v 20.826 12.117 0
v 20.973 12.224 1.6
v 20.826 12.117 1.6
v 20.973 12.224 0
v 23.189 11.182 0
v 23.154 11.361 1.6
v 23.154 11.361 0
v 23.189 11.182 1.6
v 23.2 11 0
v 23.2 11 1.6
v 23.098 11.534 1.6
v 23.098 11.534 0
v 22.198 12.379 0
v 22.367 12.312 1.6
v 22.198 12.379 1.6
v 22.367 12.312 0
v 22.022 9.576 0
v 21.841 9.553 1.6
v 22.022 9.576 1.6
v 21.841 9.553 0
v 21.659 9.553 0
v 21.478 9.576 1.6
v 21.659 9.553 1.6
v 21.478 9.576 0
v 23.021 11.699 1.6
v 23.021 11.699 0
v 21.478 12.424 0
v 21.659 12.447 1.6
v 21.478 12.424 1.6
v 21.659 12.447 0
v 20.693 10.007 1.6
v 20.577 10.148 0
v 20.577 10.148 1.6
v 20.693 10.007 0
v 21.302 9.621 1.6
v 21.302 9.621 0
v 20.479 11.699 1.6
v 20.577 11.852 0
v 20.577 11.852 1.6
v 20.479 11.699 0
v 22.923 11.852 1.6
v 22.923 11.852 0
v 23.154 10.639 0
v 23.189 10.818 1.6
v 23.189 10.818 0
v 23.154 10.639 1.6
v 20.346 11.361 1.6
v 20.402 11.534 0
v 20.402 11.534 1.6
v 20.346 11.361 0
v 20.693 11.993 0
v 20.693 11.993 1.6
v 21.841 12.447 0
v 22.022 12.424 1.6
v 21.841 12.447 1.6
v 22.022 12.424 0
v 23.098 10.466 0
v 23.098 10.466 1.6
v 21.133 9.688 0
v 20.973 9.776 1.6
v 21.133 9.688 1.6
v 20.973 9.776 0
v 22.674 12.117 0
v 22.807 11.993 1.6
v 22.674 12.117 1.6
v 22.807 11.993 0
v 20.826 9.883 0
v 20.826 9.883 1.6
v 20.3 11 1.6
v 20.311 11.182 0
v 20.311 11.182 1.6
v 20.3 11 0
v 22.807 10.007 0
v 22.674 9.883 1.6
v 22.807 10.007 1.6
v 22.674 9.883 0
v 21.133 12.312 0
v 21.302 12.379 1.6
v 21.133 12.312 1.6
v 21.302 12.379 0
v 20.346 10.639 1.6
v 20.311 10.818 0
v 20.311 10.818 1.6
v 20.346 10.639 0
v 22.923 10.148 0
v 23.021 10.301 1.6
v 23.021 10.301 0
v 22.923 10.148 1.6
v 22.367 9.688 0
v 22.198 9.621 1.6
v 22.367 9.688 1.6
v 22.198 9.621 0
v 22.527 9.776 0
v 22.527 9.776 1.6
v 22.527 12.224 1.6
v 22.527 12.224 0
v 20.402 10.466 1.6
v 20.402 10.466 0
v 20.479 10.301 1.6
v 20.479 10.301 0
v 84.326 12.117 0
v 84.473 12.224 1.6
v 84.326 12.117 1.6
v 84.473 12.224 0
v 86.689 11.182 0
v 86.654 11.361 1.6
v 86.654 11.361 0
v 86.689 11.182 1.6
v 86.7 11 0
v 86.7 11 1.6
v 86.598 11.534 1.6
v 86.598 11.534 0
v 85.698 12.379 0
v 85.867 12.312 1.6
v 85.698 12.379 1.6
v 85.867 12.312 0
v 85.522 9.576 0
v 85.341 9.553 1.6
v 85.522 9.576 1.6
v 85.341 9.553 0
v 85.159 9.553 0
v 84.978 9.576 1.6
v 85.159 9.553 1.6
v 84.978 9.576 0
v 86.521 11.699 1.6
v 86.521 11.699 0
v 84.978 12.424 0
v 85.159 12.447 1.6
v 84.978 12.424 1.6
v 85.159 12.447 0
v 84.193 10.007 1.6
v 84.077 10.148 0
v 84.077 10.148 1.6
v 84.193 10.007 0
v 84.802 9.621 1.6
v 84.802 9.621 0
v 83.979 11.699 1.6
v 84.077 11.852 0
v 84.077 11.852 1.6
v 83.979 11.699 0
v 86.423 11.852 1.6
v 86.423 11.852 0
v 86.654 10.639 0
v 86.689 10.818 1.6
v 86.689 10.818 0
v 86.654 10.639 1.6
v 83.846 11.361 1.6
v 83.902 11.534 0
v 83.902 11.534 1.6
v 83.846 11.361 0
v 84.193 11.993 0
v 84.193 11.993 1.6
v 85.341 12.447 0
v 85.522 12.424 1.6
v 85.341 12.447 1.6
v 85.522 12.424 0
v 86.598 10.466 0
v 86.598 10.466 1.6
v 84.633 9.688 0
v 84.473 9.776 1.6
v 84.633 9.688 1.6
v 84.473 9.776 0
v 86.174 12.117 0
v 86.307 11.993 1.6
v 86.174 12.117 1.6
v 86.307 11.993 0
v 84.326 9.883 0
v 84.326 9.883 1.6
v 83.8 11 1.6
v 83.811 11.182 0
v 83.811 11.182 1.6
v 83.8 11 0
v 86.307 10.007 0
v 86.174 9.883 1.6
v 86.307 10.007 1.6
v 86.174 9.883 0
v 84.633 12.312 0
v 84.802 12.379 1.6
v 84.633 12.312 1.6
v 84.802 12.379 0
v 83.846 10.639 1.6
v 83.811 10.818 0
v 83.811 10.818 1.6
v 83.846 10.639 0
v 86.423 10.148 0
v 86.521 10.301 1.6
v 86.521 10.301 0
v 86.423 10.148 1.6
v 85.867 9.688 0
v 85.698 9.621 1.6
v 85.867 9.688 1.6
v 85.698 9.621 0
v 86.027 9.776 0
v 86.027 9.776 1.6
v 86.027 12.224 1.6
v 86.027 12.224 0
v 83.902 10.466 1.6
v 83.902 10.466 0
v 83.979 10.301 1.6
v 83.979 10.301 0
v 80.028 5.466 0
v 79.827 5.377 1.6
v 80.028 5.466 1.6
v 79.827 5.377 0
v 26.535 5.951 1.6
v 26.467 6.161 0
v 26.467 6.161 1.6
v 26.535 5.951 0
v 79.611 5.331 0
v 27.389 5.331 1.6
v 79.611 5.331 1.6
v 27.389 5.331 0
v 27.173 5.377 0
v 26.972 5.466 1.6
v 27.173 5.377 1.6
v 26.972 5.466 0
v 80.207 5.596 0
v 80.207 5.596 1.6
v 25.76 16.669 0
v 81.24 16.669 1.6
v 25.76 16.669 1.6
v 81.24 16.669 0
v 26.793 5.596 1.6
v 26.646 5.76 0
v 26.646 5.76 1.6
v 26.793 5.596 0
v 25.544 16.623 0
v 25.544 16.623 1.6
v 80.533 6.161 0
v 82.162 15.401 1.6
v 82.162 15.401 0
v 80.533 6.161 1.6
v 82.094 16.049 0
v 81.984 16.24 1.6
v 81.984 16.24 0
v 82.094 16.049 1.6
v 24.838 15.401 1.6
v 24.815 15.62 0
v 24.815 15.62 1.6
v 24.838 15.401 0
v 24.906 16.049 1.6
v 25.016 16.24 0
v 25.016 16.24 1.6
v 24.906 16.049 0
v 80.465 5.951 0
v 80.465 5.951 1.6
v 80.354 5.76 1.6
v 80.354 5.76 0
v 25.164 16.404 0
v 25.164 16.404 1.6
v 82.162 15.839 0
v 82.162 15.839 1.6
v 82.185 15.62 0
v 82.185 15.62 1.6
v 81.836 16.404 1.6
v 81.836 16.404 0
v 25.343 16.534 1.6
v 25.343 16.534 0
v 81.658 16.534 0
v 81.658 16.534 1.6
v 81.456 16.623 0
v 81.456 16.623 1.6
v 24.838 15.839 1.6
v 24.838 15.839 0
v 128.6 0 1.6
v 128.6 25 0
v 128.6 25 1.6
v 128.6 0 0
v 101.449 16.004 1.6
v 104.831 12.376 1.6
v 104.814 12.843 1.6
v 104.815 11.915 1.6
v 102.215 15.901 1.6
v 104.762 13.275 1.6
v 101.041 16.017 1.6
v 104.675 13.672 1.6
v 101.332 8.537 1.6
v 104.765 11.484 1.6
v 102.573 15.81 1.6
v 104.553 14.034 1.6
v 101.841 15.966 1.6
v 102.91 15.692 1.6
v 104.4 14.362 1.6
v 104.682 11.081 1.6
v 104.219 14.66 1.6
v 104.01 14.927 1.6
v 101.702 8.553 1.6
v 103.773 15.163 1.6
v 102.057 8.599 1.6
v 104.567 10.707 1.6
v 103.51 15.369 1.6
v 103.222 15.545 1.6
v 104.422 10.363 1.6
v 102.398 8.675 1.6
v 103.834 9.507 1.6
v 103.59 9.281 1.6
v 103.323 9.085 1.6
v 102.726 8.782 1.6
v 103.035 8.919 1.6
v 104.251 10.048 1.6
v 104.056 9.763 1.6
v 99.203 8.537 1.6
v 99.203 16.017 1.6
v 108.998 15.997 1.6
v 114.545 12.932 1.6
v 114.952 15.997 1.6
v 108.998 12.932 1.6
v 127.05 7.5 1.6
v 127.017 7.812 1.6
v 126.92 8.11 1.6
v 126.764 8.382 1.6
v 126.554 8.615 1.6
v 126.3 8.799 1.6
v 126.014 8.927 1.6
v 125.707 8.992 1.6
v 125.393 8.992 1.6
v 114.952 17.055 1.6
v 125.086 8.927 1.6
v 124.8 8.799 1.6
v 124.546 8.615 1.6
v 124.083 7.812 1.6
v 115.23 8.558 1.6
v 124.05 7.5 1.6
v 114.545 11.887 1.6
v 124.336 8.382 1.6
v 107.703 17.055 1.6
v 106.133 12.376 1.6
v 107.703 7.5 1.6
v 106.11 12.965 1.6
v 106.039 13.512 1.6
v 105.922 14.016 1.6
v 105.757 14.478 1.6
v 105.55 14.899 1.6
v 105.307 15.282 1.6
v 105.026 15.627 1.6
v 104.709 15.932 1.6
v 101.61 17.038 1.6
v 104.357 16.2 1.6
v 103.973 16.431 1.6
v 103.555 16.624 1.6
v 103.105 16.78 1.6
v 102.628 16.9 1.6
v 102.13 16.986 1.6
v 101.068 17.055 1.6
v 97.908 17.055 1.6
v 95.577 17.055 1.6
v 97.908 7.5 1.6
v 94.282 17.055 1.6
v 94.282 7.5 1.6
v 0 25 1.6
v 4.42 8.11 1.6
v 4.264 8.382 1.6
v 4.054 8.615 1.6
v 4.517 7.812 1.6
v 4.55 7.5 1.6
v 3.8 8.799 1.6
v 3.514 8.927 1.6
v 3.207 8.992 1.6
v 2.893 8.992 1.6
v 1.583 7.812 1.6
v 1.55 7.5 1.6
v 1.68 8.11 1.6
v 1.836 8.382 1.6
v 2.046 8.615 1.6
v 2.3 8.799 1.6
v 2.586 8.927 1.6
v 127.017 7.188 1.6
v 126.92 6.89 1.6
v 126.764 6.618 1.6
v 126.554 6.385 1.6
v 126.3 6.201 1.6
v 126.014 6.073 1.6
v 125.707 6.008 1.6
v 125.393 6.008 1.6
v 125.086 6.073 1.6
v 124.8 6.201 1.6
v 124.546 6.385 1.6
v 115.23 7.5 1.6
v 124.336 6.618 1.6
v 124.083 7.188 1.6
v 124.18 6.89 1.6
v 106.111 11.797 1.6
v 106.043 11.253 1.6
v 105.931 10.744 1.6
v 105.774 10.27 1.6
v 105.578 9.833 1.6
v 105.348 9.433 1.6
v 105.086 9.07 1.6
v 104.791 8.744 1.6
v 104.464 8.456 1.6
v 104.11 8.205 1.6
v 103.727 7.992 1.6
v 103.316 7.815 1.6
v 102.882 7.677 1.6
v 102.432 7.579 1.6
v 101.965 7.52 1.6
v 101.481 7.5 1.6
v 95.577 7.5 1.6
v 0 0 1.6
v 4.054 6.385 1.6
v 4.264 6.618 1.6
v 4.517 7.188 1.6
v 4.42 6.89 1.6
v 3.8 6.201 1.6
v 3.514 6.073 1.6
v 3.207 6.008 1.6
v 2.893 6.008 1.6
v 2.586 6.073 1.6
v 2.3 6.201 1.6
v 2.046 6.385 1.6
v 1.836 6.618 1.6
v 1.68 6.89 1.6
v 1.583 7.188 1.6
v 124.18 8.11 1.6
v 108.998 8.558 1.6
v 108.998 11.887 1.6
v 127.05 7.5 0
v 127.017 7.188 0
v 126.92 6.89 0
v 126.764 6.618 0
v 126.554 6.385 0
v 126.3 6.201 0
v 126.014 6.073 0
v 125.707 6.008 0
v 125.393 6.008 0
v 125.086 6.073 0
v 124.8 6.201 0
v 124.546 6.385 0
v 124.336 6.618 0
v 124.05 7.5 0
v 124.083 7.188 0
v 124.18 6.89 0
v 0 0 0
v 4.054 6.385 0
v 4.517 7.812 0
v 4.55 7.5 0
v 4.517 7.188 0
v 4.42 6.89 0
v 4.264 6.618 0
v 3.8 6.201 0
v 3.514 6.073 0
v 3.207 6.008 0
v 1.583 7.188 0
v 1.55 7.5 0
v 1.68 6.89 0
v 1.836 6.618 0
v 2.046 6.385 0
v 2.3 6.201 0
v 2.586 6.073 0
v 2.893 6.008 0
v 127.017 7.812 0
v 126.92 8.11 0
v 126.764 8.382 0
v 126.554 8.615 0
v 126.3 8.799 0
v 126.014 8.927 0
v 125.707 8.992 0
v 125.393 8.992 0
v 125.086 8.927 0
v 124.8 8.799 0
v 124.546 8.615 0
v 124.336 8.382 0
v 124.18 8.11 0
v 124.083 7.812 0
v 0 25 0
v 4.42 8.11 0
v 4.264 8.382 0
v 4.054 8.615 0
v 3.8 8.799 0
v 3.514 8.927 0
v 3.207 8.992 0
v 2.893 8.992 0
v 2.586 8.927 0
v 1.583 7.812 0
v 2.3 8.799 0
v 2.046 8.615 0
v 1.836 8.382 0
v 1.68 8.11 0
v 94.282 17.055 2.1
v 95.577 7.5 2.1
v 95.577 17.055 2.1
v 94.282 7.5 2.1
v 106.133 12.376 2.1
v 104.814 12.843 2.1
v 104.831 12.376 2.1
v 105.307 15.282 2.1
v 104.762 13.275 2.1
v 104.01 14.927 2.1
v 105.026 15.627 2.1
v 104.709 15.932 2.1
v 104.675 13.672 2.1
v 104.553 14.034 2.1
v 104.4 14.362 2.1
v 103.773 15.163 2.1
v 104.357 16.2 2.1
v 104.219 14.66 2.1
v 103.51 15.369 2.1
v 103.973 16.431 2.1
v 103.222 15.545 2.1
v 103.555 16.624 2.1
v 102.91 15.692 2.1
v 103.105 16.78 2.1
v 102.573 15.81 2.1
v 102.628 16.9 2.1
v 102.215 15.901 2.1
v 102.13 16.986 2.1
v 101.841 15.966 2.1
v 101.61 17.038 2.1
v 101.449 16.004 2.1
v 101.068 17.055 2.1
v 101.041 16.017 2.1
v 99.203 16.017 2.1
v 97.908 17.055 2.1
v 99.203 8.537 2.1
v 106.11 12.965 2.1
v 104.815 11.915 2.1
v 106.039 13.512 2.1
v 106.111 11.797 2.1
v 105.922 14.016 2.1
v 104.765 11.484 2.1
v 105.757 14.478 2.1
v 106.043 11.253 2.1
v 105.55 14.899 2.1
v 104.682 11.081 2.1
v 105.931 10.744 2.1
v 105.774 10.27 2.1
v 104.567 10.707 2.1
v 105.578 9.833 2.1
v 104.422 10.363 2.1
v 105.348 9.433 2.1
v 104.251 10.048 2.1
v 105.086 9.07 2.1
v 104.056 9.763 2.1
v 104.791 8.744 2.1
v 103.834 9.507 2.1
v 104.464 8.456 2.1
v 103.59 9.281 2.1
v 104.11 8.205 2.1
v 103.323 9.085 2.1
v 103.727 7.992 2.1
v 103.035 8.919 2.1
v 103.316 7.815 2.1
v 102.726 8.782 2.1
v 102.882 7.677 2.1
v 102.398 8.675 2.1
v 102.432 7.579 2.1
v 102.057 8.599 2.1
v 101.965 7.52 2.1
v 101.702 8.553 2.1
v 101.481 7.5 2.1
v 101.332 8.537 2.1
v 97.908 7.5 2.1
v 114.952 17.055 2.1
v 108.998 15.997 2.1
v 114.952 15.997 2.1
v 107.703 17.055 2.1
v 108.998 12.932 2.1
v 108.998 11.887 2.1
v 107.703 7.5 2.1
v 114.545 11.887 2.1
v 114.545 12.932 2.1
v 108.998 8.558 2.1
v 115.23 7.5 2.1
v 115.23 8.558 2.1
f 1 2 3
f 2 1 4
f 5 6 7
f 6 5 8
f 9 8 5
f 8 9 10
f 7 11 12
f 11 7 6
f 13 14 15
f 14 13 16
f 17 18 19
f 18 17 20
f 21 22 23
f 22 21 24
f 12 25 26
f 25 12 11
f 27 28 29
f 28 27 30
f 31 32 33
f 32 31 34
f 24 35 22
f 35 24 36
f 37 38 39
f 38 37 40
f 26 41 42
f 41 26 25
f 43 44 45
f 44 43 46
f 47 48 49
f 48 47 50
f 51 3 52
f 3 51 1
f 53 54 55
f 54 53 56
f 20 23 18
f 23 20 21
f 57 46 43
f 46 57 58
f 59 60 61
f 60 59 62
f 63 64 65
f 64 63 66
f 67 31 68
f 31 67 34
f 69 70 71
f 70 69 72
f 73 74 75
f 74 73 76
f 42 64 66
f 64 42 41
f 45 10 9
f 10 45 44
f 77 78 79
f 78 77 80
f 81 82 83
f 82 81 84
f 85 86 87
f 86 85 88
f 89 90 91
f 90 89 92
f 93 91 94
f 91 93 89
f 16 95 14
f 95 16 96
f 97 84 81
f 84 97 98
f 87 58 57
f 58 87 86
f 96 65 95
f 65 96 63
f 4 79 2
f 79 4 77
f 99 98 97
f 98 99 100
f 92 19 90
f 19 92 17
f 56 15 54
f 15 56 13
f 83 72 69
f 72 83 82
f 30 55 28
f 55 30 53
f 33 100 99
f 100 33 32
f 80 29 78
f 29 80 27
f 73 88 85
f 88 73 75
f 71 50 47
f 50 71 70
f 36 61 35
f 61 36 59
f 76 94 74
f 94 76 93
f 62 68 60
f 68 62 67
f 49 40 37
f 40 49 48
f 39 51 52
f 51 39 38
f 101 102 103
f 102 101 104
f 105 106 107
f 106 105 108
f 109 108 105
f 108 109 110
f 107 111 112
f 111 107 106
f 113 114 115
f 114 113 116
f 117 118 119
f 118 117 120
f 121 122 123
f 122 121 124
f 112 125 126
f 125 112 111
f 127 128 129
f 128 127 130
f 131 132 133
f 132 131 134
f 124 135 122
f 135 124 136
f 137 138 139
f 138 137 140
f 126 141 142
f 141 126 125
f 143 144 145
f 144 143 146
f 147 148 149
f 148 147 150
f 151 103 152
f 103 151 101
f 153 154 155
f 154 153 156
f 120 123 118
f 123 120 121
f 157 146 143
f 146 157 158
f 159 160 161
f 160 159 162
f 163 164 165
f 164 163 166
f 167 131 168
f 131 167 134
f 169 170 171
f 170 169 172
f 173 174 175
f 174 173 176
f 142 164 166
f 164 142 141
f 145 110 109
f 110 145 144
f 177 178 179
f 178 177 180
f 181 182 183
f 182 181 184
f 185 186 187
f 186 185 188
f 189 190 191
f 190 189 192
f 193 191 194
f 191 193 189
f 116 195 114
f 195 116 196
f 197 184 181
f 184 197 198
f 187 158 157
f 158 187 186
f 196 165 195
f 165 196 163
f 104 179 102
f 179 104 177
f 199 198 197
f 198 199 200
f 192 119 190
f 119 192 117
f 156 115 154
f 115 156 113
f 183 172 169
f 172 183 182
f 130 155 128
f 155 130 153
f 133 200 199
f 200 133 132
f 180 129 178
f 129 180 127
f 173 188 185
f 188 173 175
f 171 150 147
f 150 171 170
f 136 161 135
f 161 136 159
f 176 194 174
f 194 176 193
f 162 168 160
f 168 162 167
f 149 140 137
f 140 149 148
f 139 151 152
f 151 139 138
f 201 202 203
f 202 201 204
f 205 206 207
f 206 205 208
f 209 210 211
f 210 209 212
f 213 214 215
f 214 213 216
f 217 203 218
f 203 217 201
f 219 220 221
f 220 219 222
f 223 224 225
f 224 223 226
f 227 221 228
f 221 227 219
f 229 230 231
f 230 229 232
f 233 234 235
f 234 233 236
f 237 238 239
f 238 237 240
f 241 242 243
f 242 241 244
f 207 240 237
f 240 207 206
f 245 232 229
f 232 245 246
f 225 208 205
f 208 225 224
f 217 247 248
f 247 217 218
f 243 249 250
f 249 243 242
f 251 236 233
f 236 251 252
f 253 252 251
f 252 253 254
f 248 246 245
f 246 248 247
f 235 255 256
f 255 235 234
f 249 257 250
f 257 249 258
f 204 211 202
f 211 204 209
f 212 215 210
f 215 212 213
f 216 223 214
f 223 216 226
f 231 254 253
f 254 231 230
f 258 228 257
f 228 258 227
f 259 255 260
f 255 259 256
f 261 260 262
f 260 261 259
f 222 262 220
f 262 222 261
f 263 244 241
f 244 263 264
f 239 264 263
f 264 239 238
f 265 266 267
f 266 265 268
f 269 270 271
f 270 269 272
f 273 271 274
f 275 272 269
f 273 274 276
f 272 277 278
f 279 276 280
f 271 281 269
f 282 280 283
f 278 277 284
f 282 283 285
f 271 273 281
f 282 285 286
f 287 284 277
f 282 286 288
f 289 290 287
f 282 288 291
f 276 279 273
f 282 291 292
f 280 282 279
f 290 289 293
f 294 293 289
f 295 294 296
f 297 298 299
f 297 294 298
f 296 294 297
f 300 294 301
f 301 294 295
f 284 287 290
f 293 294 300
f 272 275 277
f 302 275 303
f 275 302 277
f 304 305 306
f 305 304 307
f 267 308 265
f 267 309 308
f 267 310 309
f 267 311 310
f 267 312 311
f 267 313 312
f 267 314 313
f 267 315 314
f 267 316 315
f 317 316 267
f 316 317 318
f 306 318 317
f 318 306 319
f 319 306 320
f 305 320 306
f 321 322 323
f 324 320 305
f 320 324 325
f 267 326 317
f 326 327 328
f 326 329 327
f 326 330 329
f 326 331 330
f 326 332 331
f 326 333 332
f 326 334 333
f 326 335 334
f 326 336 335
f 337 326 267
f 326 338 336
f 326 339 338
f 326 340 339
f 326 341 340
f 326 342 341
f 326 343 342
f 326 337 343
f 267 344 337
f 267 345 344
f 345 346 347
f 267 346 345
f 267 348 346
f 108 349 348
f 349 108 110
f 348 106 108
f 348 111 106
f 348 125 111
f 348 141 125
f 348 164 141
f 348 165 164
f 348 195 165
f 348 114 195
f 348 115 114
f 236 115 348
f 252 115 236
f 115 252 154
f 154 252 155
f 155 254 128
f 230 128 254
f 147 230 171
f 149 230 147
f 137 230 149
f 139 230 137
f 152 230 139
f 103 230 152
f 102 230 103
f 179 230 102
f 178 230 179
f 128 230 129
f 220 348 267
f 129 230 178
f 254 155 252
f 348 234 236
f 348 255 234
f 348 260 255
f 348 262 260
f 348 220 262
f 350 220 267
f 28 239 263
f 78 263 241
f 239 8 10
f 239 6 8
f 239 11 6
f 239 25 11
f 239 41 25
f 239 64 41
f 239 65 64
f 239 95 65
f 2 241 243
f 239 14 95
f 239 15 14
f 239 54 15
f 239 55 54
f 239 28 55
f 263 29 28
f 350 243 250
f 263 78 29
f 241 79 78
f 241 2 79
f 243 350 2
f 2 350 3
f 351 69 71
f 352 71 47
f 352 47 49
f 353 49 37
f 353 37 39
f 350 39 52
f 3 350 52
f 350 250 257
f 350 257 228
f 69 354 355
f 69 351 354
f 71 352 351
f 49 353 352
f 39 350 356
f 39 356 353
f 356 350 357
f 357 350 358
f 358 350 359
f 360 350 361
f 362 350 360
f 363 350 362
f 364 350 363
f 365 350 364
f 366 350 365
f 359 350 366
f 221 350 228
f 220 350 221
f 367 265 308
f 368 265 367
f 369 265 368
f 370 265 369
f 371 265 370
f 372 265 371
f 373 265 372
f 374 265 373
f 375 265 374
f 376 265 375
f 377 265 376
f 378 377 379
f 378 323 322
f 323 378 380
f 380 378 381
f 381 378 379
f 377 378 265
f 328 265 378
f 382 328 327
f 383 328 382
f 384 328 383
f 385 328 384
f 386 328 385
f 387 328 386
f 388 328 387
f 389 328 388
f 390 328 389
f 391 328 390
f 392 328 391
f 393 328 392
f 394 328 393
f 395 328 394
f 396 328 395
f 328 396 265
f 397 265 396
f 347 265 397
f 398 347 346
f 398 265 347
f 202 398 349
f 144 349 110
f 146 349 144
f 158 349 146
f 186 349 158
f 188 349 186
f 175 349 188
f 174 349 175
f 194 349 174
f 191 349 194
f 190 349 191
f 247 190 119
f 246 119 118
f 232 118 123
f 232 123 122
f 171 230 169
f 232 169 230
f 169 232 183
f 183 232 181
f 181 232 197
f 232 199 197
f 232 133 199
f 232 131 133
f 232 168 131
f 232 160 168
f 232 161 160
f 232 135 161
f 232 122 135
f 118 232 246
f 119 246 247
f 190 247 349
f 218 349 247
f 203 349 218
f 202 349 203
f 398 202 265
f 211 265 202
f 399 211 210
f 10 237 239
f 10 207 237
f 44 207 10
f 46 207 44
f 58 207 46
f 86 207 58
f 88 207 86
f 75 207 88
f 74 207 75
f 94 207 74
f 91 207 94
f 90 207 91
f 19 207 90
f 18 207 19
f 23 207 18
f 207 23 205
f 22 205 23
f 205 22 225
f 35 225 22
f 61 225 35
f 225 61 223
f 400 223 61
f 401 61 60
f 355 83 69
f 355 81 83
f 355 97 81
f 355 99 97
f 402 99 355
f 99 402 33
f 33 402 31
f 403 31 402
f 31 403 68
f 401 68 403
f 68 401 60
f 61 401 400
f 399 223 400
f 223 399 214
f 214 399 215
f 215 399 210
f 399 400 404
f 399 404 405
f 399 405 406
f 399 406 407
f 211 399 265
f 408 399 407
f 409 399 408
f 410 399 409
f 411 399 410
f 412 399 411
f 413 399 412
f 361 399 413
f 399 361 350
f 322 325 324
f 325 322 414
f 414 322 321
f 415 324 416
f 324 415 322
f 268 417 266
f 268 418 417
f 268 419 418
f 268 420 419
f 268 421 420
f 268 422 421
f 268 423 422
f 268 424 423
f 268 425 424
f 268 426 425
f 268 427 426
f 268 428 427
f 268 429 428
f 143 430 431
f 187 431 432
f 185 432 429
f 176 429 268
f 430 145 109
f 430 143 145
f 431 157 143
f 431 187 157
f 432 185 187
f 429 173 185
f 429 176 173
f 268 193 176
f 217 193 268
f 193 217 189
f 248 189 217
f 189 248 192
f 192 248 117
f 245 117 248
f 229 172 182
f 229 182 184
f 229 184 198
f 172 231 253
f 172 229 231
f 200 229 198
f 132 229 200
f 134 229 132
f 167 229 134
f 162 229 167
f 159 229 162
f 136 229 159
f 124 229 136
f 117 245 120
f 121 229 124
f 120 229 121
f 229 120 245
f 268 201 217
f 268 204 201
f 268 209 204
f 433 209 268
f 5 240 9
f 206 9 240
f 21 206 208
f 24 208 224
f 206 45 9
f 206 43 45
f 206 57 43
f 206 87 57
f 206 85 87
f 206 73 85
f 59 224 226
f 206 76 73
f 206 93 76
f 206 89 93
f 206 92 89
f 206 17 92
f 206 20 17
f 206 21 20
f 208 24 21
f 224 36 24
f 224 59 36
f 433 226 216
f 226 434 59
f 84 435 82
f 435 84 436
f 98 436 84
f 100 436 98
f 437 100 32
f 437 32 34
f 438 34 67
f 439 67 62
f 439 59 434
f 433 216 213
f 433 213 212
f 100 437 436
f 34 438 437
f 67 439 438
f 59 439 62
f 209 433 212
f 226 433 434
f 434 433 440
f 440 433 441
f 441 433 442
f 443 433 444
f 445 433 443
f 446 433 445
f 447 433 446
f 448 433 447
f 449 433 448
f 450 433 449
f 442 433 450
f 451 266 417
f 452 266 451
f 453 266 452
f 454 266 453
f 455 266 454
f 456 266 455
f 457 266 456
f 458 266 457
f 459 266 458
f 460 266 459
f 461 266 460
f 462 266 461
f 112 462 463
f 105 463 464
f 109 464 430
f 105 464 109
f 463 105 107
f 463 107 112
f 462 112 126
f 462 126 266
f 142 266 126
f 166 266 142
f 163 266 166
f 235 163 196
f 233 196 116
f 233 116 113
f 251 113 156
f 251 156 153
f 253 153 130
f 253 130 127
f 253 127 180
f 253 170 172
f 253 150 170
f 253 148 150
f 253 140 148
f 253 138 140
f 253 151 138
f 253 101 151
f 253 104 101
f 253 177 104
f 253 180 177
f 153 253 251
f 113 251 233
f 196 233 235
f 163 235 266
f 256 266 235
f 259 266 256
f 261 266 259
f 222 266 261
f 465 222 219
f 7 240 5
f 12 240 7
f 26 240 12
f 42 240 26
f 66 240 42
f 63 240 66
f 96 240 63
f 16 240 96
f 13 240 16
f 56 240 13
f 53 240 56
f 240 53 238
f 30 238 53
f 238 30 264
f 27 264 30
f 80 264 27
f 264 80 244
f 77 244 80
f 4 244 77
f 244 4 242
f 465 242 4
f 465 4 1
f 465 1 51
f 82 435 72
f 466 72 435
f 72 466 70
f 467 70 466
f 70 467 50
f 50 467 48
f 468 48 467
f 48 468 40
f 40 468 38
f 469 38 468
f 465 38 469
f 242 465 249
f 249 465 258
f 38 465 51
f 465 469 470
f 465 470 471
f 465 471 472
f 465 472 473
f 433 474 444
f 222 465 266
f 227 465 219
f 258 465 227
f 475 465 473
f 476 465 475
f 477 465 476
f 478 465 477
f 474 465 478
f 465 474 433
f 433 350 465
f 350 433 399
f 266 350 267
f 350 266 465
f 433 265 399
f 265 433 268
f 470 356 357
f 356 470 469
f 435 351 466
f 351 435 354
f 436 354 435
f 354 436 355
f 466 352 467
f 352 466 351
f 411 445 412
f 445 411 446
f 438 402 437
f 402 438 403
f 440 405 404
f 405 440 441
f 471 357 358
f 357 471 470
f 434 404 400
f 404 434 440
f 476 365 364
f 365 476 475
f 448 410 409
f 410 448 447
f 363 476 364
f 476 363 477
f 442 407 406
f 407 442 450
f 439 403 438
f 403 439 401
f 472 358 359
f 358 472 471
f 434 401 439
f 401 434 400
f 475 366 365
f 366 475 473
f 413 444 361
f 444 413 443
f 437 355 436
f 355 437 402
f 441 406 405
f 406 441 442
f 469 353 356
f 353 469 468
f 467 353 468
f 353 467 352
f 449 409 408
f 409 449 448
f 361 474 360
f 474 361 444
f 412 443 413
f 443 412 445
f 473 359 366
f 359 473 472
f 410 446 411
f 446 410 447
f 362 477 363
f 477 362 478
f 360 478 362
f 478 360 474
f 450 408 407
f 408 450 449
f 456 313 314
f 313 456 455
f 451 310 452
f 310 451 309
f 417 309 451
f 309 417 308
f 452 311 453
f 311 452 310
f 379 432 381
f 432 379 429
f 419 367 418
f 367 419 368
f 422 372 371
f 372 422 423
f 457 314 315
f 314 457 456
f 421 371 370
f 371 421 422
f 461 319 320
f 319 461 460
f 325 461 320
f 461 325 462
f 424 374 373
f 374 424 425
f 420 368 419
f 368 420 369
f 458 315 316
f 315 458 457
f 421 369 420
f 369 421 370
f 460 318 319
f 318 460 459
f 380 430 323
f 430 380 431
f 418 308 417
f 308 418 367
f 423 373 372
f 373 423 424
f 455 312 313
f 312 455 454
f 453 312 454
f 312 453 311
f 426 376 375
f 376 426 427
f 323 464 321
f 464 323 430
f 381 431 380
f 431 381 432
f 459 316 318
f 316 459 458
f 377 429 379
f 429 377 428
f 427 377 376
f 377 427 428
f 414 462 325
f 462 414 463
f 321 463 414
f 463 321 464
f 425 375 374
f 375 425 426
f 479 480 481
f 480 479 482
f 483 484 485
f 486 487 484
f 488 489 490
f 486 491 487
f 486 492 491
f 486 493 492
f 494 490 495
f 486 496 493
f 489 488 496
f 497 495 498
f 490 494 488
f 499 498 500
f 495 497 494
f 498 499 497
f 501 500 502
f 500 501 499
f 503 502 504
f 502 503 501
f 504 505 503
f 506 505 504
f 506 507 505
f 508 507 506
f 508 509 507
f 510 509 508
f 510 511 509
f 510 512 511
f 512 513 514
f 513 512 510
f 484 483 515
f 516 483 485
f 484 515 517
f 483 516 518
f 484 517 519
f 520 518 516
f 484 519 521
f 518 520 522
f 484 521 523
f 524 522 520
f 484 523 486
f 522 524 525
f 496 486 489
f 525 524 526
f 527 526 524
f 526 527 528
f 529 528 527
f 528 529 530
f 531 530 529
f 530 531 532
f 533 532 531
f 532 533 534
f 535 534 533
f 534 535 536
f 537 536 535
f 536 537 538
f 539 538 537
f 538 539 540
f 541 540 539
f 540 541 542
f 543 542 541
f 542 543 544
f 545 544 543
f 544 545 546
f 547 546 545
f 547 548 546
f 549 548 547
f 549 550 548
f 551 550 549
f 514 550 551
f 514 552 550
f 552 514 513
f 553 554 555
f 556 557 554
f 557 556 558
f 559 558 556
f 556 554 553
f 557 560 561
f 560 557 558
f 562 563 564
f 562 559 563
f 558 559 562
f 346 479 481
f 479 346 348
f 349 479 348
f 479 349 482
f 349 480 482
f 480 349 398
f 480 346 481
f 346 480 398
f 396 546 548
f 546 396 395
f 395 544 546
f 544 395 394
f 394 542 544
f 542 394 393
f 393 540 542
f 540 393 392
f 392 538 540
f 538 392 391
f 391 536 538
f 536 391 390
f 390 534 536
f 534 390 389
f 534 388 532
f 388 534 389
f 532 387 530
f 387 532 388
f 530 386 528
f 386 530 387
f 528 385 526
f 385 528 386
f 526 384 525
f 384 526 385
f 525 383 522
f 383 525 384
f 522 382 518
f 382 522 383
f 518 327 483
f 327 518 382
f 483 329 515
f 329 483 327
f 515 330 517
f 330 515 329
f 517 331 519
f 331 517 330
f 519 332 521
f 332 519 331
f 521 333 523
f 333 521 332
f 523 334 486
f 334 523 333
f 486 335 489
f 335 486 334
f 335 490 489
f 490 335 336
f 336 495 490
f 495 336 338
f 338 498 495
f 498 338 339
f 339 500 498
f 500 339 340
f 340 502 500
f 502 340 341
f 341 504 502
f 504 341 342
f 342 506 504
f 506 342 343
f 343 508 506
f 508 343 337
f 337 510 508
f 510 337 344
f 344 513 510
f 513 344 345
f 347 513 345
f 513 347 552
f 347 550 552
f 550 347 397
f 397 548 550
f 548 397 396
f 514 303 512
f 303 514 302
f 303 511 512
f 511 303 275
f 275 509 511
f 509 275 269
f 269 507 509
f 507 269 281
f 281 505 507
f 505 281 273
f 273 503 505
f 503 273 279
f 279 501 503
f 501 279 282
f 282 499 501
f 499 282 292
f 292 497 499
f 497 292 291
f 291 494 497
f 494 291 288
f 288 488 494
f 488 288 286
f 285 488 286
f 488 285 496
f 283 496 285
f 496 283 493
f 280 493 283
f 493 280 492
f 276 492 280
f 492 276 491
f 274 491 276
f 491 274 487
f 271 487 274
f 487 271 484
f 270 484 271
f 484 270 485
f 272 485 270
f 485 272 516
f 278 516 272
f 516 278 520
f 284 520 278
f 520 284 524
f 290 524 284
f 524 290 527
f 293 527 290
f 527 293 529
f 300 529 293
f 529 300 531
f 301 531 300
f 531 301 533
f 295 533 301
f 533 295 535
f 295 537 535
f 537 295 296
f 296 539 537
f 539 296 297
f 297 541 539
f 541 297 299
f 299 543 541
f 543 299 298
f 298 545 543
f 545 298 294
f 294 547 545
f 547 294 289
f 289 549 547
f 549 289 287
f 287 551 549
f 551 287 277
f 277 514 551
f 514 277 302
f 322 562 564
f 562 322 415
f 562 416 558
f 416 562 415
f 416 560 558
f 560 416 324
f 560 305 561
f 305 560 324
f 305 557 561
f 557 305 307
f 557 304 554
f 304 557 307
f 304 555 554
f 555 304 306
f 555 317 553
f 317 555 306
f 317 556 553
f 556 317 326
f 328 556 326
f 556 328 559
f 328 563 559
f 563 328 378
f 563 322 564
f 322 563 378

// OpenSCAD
/************************************************************************

	WE_IDE_DB37_cover.scad
    
	Acorn Archimedes WE IDE Podule (DB37) cover
    Copyright (C) 2020 Simon Inns
    
    This is free software: you can redistribute it and/or modify
	it under the terms of the GNU General Public License as published by
	the Free Software Foundation, either version 3 of the License, or
	(at your option) any later version.
    
    This program is distributed in the hope that it will be useful,
    but WITHOUT ANY WARRANTY; without even the implied warranty of
    MERCHANTABILITY or FITNESS FOR A PARTICULAR PURPOSE.  See the
    GNU General Public License for more details.
    
    You should have received a copy of the GNU General Public License
    along with this program.  If not, see <http://www.gnu.org/licenses/>.
	
    Email: simon.inns@gmail.com
    
************************************************************************/

$fn = 30;
sides = 30;

// This is a replacement podule cover for the Watford Electronics IDE
// podules produced in 1991 which has a 37 pin female D-SUB external
// connector.

// D-Sub functions copied from the openscad-model-library:
// https://github.com/cznewt/openscad-model-library/blob/master/lib/connector/connector_dsub.scad
module hex_bolt_extrude(depth, head_h, body, head, clear) {
  translate([0,0,head_h/2]) rotate([0, 0, 90]) hex_head_extrude(head_h, head, clear);
  translate([0,0,head_h]) bolt_body_extrude(depth-head_h+clear, body, clear);
}

module bolt_body_extrude(height, diameter, clear) {
    radius = diameter/2+clear*2;
    cylinder(h=height, r1=radius, r2=radius, center=false, $fn=50);
}

module hex_head_extrude(height, diameter, clear) {
    height = height+clear;
	radius = diameter+1+clear*4;
    angle = 360/6;
	cote = (radius)/tan(angle);

	union() {
		rotate([0,0,0])
			cube([radius,cote,height],center=true);
		rotate([0,0,angle])
			cube([radius,cote,height],center=true);
		rotate([0,0,2*angle])
			cube([radius,cote,height],center=true);
	}
}

// Note: this is modified slightly to get the holes to the right diameter
module m1_6_hex_bolt_extrude(depth, head, clear) {
  translate([0,0,-depth/2]) hex_bolt_extrude(depth, head, 2.5, 3.41, clear);
}

module connector_dsub_extrusion(dimensions,depth,clear)
{
    
    b = dimensions[0];
    d = dimensions[1];
    f = dimensions[2];
    k = dimensions[3];
    h = depth+clear;
    g = clear;

    cut_angle = 10;
    mounting_hole = 3.05;
    o = 2*(g+f-k)*tan(cut_angle);

        union()
        {
            hull()
            {
                translate([-(g+d-k),(g+f-k),-h/2])
                    cylinder(h=h, d=k, $fn=sides);
                translate([(g+d-k),(g+f-k),-h/2])
                    cylinder(h=h, d=k, $fn=sides);
                translate([-(g+d-k)+o,-(g+f-k),-h/2])
                    cylinder(h=h, d=k, $fn=sides);
                translate([(g+d-k)-o,-(g+f-k),-h/2])
                    cylinder(h=h, d=k, $fn=sides);
            }

            translate([-b,0,0])
                m1_6_hex_bolt_extrude(h, 1, 0.1);

            translate([b,0,0])
                m1_6_hex_bolt_extrude(h, 1, 0.1);
        }
}

module connector_dsub_37F_extrusion(depth,clear)
{
    dimensions = [31.75,29.54,6.53,2.11];
    connector_dsub_extrusion(dimensions,depth,clear);
}
// End of copied modules

// Main code to draw podule plate

// Standard plate thickness is 1.6mm
plate_thickness = 1.6;

difference() {
    // Main plate
    cube([128.6, 25.0, plate_thickness], center = false);

    // M2.5 screw hole left
    translate([(128.6 - 122.5) / 2, 7.5, -1.0]) {
        cylinder(plate_thickness + 2, 3.0 / 2, 3.0 / 2);
    }

    // M2.5 screw hole right
    translate([128.6 - ((128.6 - 122.5) / 2), 7.5, -1.0]) {
        cylinder(plate_thickness + 2, 3.0 / 2, 3.0 / 2);
    }

    translate([22 + 31.5,11,0]) {
        connector_dsub_37F_extrusion(plate_thickness + 2, 0.2);
    }
}

// Add some text to the cover
content = "IDE";
font = "Liberation Sans";

translate ([93, (25 / 2) - (10 / 2) , plate_thickness]) {
   linear_extrude(height = 0.5) {
       text(content, font = font, size = 10);
     }
 }
